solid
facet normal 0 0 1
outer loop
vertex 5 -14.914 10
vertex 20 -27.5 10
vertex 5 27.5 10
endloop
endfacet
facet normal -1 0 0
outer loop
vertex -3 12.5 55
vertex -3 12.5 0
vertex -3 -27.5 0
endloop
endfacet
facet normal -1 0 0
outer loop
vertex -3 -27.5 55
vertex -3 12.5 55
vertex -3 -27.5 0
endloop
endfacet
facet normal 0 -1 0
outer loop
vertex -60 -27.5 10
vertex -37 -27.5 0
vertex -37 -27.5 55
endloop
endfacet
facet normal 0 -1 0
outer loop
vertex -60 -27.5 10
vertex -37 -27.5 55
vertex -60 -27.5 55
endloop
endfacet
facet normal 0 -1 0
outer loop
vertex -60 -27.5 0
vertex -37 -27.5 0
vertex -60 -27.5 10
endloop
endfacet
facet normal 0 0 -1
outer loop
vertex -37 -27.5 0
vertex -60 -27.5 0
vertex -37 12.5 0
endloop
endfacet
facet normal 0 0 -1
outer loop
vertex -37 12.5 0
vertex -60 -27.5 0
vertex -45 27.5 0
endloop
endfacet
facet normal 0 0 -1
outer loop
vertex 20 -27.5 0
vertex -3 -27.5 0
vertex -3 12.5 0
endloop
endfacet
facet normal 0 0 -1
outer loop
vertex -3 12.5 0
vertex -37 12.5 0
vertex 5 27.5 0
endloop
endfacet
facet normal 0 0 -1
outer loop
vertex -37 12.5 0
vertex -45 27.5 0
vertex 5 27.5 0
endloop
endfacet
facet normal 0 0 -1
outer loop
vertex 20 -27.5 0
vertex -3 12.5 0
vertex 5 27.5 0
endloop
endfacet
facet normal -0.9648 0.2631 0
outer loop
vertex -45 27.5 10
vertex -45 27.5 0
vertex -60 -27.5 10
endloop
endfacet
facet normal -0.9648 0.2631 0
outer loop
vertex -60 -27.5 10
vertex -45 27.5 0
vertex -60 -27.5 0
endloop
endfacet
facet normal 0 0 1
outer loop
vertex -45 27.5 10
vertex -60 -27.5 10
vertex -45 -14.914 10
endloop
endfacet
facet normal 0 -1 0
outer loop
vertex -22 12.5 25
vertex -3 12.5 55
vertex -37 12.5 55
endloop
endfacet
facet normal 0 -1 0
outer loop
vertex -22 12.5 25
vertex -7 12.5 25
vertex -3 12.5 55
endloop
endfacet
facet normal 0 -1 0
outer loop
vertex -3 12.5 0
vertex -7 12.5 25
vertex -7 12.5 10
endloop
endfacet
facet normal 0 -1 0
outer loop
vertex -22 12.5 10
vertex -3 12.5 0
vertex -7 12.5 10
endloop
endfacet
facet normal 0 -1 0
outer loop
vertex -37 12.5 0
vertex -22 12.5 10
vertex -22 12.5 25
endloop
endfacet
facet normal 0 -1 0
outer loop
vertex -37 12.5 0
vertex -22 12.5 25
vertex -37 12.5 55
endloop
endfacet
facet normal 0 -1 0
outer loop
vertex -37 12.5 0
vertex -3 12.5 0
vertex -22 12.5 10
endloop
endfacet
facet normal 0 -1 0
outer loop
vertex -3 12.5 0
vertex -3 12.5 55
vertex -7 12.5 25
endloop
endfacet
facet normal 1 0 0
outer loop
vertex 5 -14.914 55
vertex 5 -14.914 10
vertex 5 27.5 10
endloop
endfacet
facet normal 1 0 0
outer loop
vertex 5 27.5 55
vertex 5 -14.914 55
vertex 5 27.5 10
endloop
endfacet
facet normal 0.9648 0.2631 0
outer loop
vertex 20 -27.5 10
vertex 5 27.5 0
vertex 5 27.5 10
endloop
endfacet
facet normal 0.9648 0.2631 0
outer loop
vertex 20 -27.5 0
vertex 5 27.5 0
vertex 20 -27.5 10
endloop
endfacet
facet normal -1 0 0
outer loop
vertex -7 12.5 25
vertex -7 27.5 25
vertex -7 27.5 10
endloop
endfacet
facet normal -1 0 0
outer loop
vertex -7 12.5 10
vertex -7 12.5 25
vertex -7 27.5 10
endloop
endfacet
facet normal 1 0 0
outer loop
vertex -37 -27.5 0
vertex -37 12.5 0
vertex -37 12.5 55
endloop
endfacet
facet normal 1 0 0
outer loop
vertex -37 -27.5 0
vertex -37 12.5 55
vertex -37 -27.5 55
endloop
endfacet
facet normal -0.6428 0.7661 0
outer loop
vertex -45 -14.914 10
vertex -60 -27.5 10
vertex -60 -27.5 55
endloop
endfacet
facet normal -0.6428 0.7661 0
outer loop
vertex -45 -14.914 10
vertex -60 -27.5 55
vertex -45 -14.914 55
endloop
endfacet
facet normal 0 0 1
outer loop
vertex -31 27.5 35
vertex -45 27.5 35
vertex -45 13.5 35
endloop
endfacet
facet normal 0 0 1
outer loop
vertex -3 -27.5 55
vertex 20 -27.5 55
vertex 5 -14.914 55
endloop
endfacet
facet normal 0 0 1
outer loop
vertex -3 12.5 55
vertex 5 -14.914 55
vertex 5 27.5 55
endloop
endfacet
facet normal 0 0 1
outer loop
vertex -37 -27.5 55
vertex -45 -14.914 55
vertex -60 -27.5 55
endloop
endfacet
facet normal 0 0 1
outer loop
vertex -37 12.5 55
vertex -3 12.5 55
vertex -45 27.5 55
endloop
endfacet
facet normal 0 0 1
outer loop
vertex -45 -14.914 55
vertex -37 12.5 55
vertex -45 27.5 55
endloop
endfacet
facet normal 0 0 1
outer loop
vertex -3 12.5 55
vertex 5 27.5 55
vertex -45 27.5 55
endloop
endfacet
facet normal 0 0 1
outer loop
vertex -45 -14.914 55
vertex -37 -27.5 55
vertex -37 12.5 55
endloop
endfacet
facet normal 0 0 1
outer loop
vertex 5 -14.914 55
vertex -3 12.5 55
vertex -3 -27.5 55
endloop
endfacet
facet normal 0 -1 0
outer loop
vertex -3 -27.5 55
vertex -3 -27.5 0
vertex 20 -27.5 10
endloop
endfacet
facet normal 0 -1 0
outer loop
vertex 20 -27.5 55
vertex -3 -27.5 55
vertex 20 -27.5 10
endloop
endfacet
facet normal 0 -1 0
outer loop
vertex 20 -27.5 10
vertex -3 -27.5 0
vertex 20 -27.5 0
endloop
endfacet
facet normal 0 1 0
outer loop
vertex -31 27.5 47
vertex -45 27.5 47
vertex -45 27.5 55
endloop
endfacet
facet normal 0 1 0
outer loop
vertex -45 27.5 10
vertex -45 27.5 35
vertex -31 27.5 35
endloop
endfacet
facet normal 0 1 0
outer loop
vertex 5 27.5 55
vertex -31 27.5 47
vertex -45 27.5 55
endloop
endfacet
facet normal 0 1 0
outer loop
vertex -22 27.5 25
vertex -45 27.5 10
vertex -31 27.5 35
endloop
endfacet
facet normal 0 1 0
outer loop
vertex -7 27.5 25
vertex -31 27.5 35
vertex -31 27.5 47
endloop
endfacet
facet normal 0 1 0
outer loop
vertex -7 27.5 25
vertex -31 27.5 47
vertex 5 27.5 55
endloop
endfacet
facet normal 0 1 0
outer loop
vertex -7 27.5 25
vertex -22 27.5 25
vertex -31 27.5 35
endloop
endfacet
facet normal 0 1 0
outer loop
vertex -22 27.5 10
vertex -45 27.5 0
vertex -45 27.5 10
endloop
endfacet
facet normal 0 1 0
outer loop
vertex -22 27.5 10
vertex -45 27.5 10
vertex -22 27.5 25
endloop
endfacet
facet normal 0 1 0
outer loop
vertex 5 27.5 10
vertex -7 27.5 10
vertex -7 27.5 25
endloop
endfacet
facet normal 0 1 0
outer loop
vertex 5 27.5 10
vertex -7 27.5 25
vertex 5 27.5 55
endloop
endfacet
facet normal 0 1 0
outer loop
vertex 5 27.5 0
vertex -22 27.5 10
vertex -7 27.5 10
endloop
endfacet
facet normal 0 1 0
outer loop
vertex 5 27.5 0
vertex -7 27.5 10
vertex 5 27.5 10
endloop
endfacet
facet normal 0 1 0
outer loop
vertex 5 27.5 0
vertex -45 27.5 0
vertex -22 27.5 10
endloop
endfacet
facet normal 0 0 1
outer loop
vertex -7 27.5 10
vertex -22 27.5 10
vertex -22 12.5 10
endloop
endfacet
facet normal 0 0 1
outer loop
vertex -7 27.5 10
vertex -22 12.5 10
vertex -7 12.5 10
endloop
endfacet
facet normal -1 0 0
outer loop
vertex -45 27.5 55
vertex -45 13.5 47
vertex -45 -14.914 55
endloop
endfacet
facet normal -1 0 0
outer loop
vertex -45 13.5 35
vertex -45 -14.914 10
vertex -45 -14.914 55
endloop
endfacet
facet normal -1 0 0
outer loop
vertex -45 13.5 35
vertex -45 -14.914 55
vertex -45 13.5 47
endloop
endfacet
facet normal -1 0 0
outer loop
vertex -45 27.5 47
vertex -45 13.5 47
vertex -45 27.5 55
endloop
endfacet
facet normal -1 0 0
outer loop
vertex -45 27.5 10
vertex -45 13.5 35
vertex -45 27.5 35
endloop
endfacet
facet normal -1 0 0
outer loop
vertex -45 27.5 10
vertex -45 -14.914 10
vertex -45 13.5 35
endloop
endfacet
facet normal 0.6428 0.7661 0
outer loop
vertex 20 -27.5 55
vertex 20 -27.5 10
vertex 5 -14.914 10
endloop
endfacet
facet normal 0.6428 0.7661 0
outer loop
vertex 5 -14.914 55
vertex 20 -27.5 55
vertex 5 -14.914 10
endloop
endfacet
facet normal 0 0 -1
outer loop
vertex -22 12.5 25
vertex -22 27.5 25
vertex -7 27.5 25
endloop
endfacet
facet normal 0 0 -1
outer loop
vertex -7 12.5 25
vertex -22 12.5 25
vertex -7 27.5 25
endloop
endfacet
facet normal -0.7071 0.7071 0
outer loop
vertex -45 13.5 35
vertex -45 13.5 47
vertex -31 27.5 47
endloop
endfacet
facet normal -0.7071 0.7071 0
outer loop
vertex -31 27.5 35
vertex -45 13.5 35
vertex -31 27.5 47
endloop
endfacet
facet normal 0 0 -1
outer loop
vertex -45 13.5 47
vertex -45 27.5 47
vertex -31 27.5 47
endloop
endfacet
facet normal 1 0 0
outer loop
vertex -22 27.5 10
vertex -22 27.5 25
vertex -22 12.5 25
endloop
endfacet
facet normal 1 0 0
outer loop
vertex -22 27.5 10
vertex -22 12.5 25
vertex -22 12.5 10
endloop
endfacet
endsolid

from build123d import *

# Parameters (mm, degrees)
EXTRUDE_1_DEPTH     = 55
EXTRUDE_2_DEPTH     = 10
SKETCH_3_W          = 15
SKETCH_3_H          = 15
CUT_EXTRUDE_1_DEPTH = 99.234413522
CUT_EXTRUDE_START   = -8
CUT_EXTRUDE_2_DEPTH = 12


with BuildPart() as part:
    # Эскиз1 → Бобышка-Вытянуть1 (new body)
    with BuildSketch(Plane.XY):
        Polygon((-20, 27.5), (-20, 12.5), (-3, 12.5), (-3, -27.5), (20, -27.5), (5, -14.913505532), (5, 27.5), align=None)
    extrude_1 = extrude(amount=EXTRUDE_1_DEPTH)

    # Эскиз2 → Бобышка-Вытянуть2 (add)
    with BuildSketch(Plane(origin=(0, 0, 0), x_dir=(-1, 0, 0), z_dir=(0, 0, -1))):
        Polygon((-5, 27.5), (-20, -27.5), (-5, -14.913505532), align=None)
    extrude_2 = extrude(amount=-EXTRUDE_2_DEPTH)

    # Зеркальное отражение1: Бобышка-Вытянуть1, Бобышка-Вытянуть2 across plane
    add(extrude_1.mirror(Plane(origin=(-20, 0, 55), x_dir=(0, 0, 1), z_dir=(-1, 0, 0))))
    add(extrude_2.mirror(Plane(origin=(-20, 0, 55), x_dir=(0, 0, 1), z_dir=(-1, 0, 0))))

    # Эскиз3 → Вырез-Вытянуть1 (cut, through all)
    with BuildSketch(Plane(origin=(0, 27.5, 0), x_dir=(1, 0, 0), z_dir=(0, 1, 0))):
        with Locations((-14.5, -17.5)):
            Rectangle(SKETCH_3_W, SKETCH_3_H)
    extrude(amount=-CUT_EXTRUDE_1_DEPTH, mode=Mode.SUBTRACT)

    # Эскиз4 → Вырез-Вытянуть2 (cut)
    with BuildSketch(Plane.XY.offset(55).offset(CUT_EXTRUDE_START)):
        Polygon((-45, 27.5), (-45, 13.5), (-31, 27.5), align=None)
    extrude(amount=-CUT_EXTRUDE_2_DEPTH, mode=Mode.SUBTRACT)


solid = part.part
